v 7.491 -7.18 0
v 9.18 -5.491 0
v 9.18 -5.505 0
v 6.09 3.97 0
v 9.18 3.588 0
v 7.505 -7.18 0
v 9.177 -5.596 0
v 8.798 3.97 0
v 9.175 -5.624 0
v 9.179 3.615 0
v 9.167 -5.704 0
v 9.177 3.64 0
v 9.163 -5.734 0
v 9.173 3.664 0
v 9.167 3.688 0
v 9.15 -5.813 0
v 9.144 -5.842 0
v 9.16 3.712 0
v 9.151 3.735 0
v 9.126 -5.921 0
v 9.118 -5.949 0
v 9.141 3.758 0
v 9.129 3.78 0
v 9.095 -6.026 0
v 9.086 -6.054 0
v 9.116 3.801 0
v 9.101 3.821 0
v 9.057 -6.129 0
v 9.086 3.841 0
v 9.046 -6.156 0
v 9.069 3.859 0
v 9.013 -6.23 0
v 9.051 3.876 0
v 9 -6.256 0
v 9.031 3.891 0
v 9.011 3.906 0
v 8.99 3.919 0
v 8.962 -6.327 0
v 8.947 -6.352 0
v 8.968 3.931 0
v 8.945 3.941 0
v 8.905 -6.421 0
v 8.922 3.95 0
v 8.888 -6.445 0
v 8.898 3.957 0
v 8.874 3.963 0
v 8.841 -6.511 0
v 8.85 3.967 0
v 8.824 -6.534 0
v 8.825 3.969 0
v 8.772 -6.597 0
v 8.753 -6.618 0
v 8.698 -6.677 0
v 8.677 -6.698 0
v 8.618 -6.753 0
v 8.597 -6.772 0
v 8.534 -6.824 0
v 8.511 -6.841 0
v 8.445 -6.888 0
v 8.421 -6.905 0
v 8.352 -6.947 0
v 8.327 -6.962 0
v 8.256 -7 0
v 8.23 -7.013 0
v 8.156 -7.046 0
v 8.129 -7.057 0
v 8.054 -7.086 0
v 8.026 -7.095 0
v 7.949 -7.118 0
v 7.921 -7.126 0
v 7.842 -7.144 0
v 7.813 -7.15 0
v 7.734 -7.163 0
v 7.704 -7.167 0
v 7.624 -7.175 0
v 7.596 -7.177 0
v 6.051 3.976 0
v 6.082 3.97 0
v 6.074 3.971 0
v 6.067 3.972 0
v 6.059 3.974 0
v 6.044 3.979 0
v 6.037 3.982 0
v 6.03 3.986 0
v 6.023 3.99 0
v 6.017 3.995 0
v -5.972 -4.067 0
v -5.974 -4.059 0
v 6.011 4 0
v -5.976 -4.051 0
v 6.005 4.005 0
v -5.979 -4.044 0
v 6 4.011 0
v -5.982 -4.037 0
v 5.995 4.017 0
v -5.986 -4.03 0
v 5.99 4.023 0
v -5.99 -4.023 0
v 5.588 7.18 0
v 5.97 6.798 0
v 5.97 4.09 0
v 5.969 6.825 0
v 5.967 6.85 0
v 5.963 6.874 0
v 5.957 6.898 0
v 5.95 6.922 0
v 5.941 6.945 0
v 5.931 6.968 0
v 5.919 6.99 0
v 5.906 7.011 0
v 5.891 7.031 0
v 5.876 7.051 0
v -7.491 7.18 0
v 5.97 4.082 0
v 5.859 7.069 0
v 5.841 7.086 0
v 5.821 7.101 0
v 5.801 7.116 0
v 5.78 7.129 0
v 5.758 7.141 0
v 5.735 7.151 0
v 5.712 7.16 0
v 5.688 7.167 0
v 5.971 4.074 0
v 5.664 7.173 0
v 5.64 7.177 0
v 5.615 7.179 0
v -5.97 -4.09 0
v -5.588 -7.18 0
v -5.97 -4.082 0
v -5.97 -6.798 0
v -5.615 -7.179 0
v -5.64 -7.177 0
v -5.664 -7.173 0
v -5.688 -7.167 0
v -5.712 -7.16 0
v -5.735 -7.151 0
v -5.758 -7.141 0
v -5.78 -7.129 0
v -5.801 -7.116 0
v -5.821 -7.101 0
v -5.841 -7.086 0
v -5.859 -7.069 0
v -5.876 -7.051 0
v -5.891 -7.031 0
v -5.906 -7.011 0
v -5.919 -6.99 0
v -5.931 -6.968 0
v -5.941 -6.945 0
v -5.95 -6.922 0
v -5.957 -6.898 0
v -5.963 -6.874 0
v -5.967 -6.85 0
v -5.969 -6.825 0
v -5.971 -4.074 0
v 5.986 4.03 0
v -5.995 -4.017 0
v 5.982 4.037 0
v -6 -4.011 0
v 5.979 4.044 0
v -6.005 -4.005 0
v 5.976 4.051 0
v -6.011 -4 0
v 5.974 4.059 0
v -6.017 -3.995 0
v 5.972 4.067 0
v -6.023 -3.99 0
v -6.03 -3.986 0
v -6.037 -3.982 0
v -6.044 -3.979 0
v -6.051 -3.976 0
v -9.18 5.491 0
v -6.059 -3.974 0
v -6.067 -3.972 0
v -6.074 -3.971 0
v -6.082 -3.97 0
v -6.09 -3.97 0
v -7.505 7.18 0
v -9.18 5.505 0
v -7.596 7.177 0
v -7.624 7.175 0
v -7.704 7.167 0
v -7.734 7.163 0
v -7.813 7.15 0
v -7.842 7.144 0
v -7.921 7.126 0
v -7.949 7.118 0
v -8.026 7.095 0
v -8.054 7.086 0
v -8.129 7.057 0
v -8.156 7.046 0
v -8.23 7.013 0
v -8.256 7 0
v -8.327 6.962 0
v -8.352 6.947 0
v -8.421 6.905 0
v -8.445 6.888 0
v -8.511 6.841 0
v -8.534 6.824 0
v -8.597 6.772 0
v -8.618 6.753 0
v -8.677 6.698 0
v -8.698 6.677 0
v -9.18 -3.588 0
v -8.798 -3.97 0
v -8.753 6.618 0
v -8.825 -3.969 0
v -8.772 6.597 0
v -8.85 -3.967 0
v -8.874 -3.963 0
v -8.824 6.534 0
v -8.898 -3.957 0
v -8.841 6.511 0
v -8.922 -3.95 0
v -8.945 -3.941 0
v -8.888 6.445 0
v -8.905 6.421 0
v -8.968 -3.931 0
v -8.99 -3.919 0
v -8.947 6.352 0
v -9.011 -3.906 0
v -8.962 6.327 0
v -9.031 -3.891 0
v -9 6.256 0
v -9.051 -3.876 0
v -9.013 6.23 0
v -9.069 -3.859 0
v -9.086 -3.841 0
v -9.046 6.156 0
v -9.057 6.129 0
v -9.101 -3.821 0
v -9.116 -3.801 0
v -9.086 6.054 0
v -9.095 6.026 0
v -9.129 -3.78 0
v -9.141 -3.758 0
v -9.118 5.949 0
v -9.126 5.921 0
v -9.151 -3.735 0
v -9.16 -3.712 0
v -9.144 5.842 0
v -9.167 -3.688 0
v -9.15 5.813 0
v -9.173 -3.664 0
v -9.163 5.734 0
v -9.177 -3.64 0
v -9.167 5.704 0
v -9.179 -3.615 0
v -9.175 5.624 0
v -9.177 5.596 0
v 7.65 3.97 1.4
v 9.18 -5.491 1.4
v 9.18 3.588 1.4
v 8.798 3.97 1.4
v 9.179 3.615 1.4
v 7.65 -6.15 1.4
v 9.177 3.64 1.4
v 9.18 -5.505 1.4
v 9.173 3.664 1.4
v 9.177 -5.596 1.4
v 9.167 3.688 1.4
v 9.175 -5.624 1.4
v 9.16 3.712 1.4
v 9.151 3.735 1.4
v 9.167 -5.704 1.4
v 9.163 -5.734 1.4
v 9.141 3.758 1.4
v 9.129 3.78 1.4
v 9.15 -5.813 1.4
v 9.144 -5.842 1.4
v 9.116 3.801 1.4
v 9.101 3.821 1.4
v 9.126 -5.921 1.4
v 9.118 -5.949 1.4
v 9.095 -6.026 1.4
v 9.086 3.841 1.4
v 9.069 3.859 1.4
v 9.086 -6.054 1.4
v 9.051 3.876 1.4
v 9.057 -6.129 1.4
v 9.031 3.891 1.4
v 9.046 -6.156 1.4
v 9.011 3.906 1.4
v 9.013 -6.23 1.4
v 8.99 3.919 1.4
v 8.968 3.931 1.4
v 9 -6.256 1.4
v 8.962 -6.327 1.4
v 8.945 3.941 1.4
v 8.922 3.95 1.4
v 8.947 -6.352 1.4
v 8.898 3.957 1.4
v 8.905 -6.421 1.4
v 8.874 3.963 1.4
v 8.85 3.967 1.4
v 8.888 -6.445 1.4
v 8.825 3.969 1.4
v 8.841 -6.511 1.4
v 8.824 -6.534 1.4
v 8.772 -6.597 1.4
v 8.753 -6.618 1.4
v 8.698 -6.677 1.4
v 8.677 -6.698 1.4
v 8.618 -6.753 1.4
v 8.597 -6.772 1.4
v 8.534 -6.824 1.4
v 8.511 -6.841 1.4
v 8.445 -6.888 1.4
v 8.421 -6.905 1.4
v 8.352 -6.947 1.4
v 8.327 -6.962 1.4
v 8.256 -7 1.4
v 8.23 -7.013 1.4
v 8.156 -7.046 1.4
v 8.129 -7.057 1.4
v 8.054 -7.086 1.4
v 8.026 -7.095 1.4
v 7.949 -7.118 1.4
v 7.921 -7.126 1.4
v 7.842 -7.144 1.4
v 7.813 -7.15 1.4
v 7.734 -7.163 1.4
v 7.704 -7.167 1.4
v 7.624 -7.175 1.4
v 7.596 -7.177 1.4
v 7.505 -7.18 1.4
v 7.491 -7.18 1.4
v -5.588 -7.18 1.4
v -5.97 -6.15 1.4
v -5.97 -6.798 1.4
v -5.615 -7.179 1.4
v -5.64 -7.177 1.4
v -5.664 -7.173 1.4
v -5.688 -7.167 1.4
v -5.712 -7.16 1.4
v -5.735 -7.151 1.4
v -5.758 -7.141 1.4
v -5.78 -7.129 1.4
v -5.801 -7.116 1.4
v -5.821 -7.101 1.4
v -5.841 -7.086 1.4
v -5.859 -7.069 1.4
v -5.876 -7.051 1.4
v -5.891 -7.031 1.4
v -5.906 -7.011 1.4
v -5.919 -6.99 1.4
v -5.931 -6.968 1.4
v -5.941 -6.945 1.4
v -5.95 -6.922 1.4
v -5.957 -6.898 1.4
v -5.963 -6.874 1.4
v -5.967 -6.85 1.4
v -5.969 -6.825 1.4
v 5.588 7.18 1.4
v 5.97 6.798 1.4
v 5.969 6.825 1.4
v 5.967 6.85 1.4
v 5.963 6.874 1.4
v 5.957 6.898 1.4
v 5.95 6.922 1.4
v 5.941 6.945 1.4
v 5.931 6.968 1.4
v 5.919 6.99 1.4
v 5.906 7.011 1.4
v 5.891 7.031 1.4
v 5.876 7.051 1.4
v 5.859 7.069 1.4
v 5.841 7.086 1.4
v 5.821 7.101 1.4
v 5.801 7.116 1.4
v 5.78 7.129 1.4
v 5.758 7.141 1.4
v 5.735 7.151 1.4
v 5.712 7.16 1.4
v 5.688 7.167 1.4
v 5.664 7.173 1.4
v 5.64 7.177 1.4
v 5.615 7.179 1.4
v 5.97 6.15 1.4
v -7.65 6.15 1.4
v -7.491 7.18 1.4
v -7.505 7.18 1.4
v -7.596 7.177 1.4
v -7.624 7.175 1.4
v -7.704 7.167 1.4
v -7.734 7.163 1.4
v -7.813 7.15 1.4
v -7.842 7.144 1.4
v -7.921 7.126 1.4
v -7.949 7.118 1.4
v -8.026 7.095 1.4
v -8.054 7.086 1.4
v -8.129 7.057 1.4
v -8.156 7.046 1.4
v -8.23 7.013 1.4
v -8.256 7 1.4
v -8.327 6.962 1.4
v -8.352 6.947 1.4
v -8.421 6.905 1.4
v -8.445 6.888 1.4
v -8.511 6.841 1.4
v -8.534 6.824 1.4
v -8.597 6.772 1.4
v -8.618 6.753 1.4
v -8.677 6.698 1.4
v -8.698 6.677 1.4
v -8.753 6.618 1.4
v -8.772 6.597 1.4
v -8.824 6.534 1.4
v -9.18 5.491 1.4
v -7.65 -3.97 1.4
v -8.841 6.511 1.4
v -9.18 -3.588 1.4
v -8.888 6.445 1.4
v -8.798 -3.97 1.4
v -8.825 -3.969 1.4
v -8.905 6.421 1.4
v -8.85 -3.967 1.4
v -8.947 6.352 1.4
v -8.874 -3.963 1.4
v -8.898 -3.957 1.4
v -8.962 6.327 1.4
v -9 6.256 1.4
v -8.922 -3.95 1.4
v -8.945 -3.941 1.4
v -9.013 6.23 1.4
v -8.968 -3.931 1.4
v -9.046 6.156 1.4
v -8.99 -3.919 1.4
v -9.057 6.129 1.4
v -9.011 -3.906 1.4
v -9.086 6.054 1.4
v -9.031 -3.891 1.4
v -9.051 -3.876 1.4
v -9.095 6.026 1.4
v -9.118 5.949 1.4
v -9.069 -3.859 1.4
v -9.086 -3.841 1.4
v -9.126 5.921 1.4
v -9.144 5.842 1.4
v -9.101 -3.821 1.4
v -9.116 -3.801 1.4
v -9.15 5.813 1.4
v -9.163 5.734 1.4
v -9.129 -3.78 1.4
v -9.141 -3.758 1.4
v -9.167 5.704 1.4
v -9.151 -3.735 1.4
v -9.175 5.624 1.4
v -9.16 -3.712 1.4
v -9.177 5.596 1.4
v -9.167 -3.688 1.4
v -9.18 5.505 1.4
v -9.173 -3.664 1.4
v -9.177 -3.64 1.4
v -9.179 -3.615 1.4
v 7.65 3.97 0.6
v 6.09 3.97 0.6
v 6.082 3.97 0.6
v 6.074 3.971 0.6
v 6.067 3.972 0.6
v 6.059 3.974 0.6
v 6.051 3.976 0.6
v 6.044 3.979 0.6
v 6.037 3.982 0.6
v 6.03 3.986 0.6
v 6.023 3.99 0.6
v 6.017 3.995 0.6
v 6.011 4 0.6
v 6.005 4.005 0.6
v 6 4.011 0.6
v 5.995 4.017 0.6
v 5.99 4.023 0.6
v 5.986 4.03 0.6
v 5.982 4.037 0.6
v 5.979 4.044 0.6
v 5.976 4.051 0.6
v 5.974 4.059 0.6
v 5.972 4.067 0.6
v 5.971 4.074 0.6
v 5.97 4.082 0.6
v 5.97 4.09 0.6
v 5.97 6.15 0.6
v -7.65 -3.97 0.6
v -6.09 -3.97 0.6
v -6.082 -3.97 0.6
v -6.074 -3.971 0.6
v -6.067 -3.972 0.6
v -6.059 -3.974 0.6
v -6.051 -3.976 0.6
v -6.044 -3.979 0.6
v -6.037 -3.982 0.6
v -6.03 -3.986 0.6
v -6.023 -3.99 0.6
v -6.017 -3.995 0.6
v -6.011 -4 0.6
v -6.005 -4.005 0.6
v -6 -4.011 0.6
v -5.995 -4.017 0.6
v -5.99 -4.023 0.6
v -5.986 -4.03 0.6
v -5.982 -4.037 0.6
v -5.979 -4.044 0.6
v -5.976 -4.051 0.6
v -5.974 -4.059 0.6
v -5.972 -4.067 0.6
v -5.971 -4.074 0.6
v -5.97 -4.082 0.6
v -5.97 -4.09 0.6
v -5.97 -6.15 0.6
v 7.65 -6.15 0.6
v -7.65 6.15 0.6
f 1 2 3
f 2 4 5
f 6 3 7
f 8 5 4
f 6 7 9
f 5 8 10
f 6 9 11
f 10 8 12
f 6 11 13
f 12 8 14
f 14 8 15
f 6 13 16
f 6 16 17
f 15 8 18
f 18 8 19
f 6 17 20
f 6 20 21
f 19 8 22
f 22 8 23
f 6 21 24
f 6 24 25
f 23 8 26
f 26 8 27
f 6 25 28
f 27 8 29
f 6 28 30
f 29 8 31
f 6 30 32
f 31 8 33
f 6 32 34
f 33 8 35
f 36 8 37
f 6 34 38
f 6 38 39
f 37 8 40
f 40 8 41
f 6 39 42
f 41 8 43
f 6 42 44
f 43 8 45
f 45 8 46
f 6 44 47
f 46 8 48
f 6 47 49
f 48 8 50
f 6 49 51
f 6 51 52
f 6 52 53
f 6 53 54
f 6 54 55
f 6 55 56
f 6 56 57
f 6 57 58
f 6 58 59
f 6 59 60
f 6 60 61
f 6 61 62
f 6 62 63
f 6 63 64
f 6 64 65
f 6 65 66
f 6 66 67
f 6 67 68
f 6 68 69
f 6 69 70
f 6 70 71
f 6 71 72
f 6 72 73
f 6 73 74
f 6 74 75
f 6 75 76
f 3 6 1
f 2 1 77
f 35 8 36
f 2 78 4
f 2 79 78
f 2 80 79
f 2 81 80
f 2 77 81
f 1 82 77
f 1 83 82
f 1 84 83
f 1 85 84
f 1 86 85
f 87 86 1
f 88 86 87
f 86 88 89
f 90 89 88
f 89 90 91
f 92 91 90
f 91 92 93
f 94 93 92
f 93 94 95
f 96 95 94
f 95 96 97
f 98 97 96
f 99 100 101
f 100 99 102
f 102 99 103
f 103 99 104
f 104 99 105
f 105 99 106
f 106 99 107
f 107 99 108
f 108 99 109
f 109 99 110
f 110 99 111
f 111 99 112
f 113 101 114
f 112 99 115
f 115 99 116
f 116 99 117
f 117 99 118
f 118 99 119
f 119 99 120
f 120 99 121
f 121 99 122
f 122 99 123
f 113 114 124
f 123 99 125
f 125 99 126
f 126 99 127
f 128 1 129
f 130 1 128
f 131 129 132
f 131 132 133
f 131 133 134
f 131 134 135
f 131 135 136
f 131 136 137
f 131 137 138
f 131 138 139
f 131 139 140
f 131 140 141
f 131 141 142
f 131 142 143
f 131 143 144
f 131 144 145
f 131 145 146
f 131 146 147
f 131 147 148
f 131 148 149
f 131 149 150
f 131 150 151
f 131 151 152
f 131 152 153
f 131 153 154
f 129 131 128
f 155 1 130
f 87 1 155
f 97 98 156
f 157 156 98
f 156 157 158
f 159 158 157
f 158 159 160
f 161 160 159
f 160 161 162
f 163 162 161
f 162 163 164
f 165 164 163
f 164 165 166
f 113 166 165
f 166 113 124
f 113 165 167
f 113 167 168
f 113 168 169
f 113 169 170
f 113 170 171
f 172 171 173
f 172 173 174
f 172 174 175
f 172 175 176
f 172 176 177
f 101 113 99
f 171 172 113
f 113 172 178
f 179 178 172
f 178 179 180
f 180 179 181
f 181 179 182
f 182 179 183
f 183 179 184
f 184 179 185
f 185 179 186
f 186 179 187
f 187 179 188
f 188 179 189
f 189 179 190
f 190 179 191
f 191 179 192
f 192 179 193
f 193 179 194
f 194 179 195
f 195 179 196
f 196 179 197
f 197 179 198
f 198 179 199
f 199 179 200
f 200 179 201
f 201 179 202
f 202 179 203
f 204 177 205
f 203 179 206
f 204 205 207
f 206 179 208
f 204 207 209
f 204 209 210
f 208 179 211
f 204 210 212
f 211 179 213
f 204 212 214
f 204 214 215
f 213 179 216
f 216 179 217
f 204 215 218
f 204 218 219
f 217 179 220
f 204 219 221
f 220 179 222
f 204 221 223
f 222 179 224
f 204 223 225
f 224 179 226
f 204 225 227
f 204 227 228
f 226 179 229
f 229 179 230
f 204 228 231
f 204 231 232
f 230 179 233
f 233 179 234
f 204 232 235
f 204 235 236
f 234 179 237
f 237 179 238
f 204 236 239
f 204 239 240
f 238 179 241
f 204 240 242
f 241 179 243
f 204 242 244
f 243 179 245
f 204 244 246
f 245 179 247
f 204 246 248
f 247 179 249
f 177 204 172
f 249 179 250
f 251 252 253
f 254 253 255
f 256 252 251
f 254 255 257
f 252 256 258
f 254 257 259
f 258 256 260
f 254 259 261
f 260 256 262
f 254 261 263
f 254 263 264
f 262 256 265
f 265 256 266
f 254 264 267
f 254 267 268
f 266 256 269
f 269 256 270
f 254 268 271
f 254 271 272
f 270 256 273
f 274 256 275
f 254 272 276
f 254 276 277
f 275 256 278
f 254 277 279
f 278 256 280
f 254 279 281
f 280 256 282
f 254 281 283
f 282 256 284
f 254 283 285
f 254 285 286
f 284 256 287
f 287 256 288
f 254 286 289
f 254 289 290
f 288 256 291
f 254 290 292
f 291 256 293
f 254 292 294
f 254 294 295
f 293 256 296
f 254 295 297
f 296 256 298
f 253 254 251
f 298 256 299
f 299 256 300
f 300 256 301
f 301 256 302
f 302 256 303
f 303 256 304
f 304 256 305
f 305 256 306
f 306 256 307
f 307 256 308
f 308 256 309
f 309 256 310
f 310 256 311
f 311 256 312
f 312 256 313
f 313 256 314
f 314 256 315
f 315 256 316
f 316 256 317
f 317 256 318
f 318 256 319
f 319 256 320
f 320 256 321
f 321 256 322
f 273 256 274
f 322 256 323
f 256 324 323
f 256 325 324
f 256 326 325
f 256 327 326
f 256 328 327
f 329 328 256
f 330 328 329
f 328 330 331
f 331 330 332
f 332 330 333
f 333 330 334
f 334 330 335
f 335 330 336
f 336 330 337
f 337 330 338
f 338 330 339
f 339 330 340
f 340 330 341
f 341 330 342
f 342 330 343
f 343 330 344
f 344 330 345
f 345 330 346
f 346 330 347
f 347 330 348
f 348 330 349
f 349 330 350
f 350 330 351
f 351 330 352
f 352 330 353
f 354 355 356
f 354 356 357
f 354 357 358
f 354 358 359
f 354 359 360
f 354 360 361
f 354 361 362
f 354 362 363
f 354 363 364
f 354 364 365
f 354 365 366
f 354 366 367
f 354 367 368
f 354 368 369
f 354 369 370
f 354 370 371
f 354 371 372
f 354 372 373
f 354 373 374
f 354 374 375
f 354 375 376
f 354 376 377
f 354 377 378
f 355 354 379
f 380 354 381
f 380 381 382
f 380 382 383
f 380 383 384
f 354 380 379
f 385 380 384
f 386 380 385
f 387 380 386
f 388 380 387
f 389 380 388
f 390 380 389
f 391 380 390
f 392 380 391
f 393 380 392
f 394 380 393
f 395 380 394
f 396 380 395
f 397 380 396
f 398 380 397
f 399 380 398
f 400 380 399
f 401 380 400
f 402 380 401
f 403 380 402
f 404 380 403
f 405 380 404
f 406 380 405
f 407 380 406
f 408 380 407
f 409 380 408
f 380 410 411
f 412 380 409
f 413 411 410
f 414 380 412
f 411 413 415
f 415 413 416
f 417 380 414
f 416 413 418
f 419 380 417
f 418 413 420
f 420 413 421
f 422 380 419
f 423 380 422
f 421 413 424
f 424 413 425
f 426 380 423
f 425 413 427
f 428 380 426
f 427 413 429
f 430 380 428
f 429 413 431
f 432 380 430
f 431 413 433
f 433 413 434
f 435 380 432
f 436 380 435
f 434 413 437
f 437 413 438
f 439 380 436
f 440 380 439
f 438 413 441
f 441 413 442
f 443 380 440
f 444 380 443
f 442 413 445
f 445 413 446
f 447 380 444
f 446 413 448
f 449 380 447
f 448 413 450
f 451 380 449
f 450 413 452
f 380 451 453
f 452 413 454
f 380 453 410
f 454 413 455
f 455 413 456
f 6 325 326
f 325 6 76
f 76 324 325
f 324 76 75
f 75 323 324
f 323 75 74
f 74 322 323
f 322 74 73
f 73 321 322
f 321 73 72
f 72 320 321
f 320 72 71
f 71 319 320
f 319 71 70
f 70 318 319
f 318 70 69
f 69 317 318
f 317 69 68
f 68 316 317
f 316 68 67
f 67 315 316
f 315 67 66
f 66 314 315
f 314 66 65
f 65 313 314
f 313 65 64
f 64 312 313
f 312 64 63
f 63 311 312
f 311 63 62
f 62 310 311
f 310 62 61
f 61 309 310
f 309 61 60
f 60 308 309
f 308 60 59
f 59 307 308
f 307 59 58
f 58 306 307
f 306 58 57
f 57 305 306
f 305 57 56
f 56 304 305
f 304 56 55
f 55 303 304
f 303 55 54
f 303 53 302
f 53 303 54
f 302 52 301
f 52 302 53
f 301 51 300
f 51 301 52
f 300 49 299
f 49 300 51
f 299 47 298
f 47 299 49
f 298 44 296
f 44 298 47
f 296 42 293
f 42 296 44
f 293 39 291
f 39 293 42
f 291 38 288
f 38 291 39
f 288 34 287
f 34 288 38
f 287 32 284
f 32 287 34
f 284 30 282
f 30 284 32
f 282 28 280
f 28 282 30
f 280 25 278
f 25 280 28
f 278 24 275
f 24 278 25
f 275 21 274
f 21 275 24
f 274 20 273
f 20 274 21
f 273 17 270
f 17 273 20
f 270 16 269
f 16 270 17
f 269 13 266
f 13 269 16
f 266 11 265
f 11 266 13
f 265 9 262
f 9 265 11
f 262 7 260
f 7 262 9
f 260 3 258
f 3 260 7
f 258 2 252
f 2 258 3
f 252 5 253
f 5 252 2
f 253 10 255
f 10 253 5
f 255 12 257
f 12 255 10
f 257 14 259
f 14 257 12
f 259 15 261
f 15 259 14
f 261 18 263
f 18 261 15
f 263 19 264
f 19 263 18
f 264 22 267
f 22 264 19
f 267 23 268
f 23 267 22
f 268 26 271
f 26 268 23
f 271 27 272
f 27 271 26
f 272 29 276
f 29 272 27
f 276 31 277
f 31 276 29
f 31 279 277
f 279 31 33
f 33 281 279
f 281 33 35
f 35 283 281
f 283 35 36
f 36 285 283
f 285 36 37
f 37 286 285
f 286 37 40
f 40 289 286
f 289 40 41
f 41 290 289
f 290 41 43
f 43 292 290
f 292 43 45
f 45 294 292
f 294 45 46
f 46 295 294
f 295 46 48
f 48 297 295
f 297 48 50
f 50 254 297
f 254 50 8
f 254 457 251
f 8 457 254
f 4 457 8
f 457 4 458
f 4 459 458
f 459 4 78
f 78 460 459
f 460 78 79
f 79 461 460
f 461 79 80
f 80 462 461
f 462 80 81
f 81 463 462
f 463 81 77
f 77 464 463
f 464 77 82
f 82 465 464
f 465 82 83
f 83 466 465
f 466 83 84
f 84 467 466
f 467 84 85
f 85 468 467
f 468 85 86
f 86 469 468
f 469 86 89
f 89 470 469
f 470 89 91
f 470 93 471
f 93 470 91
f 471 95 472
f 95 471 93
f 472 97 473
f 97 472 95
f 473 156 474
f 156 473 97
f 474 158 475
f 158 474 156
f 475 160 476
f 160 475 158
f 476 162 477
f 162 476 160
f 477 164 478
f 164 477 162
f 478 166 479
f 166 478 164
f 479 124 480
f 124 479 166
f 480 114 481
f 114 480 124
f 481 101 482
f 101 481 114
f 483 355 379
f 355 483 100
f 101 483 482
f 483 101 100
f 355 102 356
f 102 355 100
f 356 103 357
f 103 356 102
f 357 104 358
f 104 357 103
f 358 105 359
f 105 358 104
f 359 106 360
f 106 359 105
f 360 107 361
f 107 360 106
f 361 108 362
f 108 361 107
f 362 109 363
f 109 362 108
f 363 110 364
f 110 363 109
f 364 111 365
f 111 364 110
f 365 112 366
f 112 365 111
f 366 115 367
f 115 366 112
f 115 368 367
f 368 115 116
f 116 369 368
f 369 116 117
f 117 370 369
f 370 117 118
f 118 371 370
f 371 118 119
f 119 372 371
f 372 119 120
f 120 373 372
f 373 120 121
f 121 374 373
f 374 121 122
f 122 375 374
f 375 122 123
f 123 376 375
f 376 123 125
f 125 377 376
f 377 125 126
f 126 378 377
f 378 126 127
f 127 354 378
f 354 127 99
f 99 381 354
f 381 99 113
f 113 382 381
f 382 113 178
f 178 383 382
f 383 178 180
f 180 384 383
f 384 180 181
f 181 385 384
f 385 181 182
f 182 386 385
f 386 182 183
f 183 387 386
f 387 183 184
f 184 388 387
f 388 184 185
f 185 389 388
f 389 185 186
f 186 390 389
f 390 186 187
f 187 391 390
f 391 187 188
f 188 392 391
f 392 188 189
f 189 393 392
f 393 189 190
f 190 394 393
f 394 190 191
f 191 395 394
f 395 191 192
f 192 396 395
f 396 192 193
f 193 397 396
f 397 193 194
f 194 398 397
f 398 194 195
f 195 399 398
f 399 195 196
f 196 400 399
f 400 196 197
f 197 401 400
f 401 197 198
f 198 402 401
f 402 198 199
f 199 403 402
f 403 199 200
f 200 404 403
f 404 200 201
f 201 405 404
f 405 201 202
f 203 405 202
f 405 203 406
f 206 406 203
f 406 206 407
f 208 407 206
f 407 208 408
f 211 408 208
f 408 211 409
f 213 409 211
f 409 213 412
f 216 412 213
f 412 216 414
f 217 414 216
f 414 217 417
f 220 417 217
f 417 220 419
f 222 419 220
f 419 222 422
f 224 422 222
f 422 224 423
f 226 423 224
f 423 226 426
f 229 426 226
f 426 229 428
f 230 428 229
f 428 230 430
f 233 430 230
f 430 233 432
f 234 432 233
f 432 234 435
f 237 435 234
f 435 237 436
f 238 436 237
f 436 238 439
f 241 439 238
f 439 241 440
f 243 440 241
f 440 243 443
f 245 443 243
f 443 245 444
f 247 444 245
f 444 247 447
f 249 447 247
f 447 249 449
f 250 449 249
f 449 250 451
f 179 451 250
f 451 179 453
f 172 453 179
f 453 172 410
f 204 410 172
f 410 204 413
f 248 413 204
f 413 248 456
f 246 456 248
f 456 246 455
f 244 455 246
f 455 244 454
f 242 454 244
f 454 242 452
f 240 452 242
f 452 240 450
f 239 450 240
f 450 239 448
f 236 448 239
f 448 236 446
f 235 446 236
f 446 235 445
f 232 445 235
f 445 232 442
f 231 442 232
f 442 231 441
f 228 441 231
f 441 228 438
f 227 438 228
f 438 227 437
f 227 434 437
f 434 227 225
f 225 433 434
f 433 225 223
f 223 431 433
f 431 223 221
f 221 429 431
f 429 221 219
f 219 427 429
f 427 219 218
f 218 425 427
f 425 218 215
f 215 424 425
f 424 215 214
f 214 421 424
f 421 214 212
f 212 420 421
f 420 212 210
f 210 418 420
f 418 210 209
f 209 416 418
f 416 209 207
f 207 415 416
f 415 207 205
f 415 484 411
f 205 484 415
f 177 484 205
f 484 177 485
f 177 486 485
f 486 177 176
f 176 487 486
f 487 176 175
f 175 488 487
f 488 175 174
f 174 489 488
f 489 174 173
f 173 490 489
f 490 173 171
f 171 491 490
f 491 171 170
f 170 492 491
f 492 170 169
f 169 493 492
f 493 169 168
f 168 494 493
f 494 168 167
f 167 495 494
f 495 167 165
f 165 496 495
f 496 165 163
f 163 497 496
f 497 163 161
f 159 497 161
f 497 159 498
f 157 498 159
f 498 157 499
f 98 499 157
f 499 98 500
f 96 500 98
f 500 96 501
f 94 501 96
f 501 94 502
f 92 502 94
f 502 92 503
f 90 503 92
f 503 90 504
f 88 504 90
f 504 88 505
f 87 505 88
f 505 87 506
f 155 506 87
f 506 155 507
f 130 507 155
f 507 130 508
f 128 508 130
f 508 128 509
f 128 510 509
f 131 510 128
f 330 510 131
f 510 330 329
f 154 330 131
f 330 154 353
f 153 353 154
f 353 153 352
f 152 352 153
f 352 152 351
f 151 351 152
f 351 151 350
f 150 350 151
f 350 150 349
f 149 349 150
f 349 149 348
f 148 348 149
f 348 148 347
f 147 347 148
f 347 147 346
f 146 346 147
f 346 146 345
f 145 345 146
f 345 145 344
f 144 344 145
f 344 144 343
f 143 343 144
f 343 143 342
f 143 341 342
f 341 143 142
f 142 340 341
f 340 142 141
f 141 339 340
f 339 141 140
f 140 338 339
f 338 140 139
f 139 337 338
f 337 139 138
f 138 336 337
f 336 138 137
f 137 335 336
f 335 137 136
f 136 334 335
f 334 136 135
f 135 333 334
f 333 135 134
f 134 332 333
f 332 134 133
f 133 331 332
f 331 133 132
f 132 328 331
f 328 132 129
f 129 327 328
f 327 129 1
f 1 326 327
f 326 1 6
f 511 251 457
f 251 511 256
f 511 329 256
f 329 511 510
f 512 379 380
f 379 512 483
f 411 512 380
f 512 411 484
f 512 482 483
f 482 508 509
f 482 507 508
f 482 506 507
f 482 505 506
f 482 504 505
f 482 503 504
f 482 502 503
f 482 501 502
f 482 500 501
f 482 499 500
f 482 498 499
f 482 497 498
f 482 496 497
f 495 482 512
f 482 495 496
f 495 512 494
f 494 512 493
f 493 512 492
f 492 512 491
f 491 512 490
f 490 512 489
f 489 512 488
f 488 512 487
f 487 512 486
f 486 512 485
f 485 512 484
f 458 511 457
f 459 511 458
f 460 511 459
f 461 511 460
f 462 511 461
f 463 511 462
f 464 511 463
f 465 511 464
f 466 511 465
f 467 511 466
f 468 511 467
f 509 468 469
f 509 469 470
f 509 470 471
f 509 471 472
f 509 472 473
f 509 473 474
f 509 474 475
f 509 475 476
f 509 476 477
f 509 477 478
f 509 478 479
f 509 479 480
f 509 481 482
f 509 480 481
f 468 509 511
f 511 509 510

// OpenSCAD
// Holder for a flat, intact payment insert (payment_mode="insert" only).
// In "core" mode the payment hardware is the donor ring itself and this
// part is empty.  Dimensions mod_l/mod_w/mod_t are PROVISIONAL.
include <gl_lib.scad>
payment_mode = "insert";
if (layout == "assembly") module_holder(); else face_up(y_diff1) module_holder();
